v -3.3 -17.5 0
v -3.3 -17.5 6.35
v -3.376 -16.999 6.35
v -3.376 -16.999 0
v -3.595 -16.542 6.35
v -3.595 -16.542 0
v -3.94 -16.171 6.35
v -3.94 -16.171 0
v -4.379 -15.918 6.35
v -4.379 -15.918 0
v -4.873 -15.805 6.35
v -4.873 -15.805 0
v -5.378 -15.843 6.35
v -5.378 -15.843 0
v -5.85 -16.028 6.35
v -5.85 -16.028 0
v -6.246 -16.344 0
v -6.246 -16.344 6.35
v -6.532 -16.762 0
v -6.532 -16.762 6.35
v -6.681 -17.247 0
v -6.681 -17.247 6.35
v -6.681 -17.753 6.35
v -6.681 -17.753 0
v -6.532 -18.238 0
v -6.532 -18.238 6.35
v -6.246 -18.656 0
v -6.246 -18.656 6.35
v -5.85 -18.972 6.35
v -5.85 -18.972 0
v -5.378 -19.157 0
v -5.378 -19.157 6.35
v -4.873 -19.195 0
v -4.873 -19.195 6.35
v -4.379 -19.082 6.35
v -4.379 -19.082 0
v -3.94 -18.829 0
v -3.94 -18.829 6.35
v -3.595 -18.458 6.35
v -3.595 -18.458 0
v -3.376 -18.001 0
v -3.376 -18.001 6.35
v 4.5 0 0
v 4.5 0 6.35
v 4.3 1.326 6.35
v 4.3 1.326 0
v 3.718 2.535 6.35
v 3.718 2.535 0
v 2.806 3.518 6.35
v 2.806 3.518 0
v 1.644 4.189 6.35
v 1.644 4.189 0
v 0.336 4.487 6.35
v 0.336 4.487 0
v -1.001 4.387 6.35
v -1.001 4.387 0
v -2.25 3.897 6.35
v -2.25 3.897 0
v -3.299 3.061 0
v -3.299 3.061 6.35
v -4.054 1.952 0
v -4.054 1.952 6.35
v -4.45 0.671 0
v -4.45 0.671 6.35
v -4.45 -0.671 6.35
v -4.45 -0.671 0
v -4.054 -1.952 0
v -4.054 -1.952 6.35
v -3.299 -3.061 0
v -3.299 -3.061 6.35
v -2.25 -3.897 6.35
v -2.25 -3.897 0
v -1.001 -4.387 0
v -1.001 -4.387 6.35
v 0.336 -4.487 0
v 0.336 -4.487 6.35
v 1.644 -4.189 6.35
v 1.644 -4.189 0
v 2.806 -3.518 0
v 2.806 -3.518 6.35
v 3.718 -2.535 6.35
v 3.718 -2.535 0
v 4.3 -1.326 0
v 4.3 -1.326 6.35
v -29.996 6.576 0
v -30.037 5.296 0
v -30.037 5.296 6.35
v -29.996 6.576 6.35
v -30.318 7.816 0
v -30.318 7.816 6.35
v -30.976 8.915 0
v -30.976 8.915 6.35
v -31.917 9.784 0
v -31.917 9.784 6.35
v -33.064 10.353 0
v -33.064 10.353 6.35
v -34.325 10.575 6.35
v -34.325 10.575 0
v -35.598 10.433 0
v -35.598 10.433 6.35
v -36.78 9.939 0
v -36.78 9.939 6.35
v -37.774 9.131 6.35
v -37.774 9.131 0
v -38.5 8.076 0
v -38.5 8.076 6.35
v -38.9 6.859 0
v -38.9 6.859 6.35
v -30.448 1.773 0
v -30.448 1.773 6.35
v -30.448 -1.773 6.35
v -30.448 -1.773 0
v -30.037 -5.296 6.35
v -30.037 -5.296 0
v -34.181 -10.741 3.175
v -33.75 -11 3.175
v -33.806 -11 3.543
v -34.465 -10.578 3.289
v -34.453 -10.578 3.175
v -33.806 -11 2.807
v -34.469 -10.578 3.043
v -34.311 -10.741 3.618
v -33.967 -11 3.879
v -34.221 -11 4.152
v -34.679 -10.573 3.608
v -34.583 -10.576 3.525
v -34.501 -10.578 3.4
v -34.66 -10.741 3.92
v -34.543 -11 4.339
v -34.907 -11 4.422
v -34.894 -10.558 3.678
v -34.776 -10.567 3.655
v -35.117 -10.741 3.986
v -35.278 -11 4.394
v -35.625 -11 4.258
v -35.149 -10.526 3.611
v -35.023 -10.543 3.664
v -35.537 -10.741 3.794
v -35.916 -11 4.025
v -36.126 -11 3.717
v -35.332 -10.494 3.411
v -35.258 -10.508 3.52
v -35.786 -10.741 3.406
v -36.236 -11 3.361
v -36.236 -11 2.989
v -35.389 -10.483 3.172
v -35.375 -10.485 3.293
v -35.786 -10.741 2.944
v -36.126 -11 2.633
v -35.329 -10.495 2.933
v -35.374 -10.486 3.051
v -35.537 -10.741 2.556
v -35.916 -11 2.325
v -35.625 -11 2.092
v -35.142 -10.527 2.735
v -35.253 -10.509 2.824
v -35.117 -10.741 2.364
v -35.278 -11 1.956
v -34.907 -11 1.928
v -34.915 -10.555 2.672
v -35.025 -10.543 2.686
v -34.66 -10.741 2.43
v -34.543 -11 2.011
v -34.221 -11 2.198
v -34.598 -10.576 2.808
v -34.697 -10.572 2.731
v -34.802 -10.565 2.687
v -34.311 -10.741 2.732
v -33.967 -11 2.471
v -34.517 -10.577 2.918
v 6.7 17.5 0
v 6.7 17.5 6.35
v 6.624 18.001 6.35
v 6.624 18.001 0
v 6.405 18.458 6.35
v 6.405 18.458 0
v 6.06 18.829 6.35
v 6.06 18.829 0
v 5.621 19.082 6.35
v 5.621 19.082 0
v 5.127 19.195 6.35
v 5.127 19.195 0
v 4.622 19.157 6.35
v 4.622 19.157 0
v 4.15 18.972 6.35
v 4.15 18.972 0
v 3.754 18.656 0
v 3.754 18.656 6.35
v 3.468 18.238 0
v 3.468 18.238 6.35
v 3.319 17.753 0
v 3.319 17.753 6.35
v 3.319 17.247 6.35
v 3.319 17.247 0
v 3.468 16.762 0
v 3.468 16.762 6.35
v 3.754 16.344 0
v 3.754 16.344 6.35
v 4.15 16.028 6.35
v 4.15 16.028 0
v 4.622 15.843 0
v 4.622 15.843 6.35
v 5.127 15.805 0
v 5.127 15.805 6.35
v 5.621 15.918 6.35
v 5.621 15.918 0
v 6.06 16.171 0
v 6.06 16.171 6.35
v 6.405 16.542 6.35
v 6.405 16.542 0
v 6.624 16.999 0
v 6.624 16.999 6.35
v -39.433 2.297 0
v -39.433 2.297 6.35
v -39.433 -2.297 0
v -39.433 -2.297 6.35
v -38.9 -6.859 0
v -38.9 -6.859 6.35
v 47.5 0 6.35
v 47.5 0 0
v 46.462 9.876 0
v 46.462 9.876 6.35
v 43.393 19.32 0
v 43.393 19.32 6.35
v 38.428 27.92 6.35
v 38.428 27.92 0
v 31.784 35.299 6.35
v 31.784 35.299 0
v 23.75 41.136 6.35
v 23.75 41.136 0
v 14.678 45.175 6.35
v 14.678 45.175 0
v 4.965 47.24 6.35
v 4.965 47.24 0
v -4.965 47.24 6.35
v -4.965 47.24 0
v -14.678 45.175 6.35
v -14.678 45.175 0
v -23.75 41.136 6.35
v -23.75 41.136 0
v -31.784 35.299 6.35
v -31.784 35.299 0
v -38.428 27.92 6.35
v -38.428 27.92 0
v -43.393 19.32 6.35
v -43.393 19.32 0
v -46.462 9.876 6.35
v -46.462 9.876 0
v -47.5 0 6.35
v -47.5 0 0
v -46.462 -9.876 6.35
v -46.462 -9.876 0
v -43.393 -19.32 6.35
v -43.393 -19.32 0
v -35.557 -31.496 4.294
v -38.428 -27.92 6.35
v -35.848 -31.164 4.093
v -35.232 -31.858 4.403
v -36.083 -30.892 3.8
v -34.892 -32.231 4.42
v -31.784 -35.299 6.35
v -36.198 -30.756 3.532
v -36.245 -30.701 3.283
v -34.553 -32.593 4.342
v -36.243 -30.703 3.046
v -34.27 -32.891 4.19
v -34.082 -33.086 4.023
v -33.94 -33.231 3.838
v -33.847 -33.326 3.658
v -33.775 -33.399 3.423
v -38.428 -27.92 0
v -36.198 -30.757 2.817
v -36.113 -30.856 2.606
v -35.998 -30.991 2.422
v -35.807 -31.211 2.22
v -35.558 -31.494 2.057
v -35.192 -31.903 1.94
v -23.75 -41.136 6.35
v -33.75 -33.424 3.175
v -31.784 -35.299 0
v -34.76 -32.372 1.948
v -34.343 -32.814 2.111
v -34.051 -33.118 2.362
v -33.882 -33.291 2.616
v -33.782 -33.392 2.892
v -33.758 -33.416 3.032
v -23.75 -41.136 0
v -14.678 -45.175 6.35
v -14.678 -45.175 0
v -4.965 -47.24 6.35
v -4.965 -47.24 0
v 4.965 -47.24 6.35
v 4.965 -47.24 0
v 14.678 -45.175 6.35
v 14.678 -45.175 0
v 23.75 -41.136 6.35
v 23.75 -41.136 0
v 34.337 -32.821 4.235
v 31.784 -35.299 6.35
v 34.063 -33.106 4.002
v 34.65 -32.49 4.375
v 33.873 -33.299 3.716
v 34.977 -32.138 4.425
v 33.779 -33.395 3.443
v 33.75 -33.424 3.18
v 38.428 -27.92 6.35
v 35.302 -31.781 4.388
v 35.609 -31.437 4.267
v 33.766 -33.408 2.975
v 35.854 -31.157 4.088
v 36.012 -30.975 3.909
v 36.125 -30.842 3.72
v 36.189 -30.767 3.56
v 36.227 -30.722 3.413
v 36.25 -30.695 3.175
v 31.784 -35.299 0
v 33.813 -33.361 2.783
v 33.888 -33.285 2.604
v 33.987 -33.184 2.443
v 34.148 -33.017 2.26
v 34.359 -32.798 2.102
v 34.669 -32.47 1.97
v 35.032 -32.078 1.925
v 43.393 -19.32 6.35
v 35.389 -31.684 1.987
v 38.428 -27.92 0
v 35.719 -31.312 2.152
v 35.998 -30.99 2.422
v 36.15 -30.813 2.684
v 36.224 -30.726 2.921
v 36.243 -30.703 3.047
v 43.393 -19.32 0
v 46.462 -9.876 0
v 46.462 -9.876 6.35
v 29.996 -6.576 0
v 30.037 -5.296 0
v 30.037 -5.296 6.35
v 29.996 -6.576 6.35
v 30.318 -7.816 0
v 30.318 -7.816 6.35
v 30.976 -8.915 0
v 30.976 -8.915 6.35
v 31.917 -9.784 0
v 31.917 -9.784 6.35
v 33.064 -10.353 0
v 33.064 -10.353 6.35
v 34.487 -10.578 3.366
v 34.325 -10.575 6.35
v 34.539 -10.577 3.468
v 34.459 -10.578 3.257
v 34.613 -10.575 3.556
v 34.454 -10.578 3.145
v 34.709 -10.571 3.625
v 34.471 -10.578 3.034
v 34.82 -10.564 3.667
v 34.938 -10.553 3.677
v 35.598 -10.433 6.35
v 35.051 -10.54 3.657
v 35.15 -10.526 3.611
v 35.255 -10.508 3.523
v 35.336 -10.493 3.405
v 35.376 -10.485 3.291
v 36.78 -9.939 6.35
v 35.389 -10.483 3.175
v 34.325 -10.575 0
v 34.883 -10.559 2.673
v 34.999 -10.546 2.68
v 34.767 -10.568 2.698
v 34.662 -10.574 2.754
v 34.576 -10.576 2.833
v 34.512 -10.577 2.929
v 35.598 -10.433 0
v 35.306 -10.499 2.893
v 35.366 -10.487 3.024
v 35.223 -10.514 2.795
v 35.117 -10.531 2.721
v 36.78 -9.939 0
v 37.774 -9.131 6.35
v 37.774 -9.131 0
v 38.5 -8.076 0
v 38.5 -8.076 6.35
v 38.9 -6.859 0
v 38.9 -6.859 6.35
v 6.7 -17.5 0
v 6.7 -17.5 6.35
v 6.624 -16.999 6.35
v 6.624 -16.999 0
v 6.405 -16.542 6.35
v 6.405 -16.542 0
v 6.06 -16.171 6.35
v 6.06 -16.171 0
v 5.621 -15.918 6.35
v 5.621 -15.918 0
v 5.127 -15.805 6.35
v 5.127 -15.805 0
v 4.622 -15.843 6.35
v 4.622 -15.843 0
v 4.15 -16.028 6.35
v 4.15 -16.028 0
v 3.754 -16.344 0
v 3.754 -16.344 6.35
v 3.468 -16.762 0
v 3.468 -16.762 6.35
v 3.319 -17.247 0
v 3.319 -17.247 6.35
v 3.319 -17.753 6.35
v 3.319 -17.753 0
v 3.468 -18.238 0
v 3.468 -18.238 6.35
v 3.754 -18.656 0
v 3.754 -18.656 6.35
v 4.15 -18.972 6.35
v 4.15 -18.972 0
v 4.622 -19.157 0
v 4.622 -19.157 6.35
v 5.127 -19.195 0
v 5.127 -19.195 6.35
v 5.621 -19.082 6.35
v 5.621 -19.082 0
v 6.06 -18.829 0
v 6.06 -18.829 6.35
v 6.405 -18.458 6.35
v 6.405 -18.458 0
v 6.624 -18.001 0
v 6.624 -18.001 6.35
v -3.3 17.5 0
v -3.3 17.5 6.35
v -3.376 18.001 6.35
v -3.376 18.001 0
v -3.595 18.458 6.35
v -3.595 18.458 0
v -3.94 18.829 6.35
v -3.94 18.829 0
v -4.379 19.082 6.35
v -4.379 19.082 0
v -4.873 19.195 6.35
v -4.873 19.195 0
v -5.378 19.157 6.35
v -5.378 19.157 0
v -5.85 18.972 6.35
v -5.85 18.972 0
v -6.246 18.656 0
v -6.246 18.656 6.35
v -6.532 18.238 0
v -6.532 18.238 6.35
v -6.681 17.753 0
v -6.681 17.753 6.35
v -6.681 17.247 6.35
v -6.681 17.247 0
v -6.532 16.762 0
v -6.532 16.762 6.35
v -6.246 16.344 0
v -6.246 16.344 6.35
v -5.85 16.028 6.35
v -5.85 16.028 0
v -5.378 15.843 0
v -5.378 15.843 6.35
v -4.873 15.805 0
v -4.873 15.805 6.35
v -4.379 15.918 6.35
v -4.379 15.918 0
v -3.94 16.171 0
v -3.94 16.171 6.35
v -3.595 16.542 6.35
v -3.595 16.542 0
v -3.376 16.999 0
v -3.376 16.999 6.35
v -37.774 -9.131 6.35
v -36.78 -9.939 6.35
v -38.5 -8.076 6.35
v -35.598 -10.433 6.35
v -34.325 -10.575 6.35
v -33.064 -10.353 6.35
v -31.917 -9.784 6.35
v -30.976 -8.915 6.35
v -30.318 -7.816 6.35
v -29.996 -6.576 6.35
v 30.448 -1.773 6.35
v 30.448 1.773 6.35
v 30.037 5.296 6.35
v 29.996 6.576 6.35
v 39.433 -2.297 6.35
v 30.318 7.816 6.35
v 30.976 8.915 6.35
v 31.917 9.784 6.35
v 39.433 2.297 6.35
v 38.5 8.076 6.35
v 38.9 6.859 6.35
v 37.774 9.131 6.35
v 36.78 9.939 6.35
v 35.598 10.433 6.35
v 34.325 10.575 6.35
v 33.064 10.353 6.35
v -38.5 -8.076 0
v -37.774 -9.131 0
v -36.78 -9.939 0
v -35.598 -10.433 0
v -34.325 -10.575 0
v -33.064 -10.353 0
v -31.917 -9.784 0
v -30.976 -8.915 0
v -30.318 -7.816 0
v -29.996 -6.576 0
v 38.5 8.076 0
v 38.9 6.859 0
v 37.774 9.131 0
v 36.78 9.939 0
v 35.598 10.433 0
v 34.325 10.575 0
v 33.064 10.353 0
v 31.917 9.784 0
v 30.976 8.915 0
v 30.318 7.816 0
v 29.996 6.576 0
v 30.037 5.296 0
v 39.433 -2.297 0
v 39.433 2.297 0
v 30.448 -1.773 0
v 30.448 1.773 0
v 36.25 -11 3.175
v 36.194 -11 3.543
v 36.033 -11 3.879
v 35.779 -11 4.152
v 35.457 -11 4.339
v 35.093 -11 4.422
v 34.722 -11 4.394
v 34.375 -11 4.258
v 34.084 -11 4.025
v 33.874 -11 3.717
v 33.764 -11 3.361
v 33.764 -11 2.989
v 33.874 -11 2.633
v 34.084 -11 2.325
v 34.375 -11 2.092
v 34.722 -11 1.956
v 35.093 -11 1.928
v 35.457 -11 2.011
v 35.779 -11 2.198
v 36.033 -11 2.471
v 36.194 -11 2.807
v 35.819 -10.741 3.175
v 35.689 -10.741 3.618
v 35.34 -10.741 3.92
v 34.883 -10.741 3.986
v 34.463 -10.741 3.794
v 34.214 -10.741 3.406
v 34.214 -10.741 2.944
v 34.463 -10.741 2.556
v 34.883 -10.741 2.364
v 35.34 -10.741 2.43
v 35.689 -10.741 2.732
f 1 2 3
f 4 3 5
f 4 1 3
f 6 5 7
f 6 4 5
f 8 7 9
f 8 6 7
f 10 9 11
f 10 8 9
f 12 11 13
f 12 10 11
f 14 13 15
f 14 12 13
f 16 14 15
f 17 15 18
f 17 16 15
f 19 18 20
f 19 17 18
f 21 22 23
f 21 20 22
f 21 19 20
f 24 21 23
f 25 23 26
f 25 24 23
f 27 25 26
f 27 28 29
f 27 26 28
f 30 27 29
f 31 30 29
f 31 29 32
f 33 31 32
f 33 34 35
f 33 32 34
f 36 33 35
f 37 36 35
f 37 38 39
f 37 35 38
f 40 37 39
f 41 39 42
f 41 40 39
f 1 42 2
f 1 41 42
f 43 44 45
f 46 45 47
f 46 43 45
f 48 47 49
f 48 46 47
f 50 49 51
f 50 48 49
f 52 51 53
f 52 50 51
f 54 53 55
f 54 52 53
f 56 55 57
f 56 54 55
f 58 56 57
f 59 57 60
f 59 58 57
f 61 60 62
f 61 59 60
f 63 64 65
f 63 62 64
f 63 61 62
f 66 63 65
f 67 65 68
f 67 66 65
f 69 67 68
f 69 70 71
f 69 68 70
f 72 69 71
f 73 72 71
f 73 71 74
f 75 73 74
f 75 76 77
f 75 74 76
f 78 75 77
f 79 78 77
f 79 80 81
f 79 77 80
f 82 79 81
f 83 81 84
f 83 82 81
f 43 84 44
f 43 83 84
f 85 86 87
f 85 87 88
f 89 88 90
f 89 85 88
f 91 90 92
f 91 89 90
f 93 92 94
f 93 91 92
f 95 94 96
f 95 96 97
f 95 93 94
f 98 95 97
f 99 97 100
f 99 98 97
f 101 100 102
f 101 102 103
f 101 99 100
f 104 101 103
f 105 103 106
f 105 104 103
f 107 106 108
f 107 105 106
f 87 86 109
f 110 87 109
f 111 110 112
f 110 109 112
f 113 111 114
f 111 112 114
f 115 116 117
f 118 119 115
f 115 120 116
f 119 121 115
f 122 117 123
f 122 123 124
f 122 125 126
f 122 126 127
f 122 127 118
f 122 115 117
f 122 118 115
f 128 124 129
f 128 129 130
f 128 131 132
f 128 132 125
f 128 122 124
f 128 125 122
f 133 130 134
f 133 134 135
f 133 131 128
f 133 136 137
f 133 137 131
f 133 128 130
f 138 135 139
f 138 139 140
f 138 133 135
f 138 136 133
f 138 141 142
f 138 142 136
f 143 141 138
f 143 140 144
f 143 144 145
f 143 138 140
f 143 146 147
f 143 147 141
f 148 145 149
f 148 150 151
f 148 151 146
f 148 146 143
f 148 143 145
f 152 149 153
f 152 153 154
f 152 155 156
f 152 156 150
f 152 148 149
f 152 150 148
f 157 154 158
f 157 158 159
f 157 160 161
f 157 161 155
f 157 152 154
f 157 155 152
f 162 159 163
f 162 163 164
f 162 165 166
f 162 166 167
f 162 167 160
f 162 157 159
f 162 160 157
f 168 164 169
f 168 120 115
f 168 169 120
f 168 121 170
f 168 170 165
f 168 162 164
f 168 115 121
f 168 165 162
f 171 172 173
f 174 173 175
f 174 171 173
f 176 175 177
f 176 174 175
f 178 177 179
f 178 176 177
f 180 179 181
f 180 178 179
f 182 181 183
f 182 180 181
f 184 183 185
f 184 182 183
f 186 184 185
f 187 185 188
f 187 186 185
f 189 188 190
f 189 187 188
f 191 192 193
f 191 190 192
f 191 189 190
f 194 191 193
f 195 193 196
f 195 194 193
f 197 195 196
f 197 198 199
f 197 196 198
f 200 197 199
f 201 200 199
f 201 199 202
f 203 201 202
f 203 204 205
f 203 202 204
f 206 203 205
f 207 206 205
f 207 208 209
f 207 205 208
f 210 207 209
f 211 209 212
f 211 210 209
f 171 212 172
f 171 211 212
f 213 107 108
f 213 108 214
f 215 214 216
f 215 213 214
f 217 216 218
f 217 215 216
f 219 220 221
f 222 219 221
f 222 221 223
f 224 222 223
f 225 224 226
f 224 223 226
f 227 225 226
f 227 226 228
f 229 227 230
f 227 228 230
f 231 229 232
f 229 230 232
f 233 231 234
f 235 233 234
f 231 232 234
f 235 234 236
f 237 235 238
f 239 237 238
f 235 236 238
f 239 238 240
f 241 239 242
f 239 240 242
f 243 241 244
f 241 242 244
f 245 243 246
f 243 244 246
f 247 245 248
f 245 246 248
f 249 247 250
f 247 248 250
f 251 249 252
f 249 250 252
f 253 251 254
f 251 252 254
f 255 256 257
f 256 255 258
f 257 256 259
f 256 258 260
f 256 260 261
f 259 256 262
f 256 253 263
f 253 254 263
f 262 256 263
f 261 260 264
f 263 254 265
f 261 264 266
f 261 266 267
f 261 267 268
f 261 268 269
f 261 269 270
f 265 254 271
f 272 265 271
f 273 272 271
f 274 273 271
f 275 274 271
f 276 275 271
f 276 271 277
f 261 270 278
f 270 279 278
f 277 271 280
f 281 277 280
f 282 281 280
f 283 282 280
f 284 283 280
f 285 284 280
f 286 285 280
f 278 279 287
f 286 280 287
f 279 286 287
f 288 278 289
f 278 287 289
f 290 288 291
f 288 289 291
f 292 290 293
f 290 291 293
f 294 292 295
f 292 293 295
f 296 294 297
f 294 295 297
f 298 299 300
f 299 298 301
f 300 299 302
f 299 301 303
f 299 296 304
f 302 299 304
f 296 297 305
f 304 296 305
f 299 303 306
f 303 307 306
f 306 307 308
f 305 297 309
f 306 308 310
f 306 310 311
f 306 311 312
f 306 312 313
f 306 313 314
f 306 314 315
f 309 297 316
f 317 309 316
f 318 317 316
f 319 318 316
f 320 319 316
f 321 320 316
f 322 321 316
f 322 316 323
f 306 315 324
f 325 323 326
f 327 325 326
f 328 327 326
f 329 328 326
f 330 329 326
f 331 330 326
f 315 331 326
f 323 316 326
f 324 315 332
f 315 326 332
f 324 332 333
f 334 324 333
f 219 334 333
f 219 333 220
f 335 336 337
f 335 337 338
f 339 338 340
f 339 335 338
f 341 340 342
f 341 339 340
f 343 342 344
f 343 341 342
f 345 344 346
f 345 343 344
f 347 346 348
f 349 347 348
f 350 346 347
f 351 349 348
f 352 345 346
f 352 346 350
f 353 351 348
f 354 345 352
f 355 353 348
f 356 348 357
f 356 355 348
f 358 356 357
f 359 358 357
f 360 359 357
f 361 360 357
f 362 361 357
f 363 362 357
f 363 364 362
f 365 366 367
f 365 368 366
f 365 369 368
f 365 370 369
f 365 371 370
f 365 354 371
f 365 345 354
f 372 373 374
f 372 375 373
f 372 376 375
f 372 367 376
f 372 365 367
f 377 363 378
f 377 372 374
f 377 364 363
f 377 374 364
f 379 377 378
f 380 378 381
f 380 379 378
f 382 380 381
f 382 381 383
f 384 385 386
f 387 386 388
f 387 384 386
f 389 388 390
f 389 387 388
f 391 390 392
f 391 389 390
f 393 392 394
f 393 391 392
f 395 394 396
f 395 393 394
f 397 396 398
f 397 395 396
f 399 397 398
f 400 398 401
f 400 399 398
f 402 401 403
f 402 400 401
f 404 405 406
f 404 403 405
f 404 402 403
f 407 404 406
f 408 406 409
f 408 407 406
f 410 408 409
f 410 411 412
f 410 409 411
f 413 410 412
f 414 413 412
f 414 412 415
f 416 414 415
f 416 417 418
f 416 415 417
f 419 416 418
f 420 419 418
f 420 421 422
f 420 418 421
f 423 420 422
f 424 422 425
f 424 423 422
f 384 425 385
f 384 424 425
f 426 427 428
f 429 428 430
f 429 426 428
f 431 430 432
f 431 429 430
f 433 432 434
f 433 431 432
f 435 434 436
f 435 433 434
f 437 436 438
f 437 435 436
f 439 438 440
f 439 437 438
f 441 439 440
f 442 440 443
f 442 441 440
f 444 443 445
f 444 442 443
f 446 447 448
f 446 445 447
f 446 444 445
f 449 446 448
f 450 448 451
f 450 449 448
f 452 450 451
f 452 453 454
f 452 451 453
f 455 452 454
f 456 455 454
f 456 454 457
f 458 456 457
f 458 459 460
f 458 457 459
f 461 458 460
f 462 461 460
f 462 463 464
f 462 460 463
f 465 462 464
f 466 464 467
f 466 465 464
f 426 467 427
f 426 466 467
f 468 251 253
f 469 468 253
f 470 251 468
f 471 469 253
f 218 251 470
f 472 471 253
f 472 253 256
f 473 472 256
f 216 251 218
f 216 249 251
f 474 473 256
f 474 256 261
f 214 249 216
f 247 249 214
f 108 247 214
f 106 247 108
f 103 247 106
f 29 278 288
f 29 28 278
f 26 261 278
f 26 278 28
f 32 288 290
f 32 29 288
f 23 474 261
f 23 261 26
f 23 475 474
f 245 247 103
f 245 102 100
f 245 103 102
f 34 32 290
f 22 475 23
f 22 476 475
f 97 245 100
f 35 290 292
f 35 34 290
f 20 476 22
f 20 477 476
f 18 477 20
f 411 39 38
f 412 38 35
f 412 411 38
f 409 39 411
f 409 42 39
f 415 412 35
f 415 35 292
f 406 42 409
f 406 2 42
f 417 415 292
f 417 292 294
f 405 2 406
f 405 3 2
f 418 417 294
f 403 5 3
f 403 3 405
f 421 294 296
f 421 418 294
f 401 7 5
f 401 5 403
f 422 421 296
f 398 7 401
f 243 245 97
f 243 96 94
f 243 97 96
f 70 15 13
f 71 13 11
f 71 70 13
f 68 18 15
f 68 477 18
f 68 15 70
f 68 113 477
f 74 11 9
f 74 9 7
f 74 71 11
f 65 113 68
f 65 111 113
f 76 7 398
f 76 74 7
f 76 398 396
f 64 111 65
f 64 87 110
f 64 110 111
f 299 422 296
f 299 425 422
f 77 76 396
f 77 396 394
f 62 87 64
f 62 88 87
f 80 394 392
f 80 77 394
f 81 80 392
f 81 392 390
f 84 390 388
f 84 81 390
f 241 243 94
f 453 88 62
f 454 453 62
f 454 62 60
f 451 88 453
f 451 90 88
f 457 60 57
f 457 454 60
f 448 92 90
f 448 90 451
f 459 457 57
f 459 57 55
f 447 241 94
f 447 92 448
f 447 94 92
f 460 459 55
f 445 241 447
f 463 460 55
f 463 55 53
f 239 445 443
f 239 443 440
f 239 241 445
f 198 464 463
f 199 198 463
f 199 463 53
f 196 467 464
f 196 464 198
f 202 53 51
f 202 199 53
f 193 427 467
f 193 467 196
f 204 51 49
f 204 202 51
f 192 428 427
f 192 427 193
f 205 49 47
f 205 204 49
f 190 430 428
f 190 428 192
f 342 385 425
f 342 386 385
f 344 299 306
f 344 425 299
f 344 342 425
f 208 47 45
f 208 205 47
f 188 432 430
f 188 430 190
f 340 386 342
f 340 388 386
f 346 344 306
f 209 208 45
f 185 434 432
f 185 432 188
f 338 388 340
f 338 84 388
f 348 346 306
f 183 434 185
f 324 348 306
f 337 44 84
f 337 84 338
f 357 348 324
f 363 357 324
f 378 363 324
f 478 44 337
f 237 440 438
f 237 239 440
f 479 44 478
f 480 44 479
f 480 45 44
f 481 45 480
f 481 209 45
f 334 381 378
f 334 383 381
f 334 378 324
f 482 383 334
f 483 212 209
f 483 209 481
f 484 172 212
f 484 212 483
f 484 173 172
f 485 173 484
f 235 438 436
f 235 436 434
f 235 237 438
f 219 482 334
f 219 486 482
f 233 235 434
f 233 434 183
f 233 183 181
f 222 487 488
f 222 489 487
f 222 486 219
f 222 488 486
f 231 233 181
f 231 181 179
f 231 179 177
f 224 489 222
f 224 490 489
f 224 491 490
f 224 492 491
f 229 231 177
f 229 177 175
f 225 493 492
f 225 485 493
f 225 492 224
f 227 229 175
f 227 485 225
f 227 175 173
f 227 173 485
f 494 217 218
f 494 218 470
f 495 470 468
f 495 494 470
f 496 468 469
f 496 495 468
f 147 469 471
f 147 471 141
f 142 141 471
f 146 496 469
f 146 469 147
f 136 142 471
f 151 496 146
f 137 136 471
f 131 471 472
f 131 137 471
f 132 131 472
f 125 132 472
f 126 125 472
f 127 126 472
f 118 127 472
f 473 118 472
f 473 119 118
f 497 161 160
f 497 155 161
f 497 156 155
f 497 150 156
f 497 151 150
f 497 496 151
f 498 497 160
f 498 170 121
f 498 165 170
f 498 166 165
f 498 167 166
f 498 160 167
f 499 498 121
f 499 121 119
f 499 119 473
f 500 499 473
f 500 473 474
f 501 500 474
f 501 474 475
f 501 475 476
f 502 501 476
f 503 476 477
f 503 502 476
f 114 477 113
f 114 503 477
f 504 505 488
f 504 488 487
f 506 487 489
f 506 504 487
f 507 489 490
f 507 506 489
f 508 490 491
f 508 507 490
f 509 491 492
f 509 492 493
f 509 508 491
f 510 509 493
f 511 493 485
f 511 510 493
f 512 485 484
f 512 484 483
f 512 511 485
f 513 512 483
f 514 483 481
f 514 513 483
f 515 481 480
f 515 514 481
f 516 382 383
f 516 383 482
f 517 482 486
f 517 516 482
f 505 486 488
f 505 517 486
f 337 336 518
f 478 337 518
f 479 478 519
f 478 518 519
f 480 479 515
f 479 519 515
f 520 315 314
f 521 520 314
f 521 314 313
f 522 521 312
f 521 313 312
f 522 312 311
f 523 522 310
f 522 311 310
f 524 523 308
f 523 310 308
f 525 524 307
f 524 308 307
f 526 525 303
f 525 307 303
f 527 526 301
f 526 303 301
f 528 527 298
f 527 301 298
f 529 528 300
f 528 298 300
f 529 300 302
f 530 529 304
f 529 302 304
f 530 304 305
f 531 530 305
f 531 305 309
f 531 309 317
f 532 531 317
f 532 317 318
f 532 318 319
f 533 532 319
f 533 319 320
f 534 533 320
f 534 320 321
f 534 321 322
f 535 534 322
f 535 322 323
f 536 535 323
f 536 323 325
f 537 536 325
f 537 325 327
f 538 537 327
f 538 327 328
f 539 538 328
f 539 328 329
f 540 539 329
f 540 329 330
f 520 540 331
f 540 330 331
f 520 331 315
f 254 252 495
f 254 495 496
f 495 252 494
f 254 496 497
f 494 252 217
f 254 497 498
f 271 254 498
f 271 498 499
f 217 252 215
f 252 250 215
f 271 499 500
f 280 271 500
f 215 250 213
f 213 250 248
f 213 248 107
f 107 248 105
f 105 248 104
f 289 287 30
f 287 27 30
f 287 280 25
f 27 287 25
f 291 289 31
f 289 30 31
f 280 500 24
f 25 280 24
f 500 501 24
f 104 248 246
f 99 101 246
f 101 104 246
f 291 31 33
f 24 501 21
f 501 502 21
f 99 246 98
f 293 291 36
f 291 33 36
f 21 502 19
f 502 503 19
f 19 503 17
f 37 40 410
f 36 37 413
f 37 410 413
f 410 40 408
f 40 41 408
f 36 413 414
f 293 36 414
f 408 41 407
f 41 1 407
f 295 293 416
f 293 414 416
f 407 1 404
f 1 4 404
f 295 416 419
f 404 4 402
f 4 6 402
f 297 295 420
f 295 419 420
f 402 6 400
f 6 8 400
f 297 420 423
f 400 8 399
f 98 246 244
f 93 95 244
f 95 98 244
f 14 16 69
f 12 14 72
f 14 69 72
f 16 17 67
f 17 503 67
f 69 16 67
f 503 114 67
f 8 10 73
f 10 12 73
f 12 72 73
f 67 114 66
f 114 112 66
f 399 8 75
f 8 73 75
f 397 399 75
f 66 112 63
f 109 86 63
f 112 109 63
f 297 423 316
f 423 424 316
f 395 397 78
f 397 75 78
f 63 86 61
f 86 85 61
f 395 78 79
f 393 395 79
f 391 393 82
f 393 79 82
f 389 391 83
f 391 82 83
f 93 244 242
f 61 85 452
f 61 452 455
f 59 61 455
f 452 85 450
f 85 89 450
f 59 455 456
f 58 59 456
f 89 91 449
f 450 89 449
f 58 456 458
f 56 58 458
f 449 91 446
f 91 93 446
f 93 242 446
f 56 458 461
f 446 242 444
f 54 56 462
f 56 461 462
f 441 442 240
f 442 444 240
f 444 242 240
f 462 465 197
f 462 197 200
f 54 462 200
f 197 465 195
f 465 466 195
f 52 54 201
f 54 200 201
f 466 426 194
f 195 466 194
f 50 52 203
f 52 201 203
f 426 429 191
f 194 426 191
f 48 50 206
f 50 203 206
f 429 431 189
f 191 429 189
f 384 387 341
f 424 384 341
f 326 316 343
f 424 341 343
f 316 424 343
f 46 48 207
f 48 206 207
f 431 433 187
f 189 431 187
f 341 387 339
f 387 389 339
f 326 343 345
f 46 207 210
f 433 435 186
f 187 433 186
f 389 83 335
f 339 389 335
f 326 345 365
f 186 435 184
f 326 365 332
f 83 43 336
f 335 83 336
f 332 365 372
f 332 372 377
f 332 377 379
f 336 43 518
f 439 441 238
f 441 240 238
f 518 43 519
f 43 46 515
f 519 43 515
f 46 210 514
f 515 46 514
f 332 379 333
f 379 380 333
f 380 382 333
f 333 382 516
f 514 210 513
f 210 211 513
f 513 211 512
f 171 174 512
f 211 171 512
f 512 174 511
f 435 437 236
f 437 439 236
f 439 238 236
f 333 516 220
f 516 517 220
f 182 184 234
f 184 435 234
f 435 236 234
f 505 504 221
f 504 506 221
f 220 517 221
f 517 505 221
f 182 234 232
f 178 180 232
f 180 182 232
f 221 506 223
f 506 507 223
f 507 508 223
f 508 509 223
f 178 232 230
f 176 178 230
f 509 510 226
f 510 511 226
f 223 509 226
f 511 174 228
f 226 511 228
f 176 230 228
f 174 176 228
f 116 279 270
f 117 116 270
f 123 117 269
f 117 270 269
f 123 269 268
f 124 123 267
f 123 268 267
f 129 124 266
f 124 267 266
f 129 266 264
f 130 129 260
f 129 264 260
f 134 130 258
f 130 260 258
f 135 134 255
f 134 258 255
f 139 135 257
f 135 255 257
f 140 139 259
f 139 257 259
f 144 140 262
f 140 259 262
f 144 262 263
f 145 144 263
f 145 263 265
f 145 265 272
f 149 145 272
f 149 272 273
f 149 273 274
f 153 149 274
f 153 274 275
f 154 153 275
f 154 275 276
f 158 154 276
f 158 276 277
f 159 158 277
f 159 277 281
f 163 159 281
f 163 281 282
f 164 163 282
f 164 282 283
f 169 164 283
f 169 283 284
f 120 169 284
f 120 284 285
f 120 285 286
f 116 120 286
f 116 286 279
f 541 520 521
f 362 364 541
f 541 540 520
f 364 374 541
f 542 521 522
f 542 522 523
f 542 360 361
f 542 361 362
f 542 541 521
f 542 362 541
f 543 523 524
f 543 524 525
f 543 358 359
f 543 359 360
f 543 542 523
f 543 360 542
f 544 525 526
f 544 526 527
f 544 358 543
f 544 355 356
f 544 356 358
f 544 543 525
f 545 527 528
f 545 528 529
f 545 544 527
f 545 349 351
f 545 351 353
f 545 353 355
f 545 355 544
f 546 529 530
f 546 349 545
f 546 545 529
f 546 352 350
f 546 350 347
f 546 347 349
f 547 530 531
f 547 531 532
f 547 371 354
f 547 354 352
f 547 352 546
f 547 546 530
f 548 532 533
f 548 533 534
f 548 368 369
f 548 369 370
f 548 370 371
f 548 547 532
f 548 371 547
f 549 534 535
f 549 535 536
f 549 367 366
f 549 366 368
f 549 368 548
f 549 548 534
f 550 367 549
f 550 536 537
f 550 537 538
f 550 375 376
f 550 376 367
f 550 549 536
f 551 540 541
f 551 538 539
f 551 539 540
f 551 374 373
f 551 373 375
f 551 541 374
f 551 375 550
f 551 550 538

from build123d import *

# Parameters (mm, degrees)
SKETCH_R       = 47.5
PAD_DEPTH      = 6.35
SKETCH001_R    = 4.5
HOLE_DEPTH     = 6.351
SKETCH002_R    = 1.7
HOLE001_DEPTH  = 25
SKETCH003_R    = 1.25
HOLE002_DEPTH  = 25
HOLE002_TIPS_R = 1.25


with BuildPart() as part:
    # Sketch → Pad (new body)
    with BuildSketch(Plane.XY):
        Circle(SKETCH_R)
        with BuildLine():
            ThreePointArc((-38.899906, 6.859103), (-39.5, 0), (-38.899906, -6.859103))
            ThreePointArc((-38.899906, -6.859103), (-33.686855, -10.509321), (-30.036636, -5.296269))
            ThreePointArc((-30.036636, 5.296269), (-30.5, 0), (-30.036636, -5.296269))
            ThreePointArc((-30.036636, 5.296269), (-33.686855, 10.509321), (-38.899906, 6.859103))
        make_face(mode=Mode.SUBTRACT)
        with BuildLine():
            ThreePointArc((30.036636, -5.296269), (30.5, 0), (30.036636, 5.296269))
            ThreePointArc((38.899906, 6.859103), (33.686855, 10.509321), (30.036636, 5.296269))
            ThreePointArc((38.899906, -6.859103), (39.5, 0), (38.899906, 6.859103))
            ThreePointArc((30.036636, -5.296269), (33.686855, -10.509321), (38.899906, -6.859103))
        make_face(mode=Mode.SUBTRACT)
    extrude(amount=PAD_DEPTH)

    # Sketch001 → Hole (cut, through all)
    with BuildSketch(Plane.XY):
        Circle(SKETCH001_R)
    extrude(amount=HOLE_DEPTH, mode=Mode.SUBTRACT)

    # Sketch002 → Hole001 (cut)
    with BuildSketch(Plane.XY):
        with Locations((-5, -17.5)):
            Circle(SKETCH002_R)
        with Locations((5, -17.5)):
            Circle(SKETCH002_R)
        with Locations((5, 17.5)):
            Circle(SKETCH002_R)
        with Locations((-5, 17.5)):
            Circle(SKETCH002_R)
    extrude(amount=HOLE001_DEPTH, mode=Mode.SUBTRACT)

    # Sketch003 → Hole002 (cut)
    with BuildSketch(Plane.XZ.offset(36)):
        with Locations((-35, 3.175)):
            Circle(SKETCH003_R)
        with Locations((35, 3.175)):
            Circle(SKETCH003_R)
    extrude(amount=-HOLE002_DEPTH, mode=Mode.SUBTRACT)

    # Hole002 tips → Hole002 tip 1 section 0
    with BuildSketch(Plane.XZ.offset(11), mode=Mode.PRIVATE) as hole002_tip_1_s0:
        with Locations((-35, 3.175)):
            Circle(HOLE002_TIPS_R)
    loft([hole002_tip_1_s0.sketch, Vertex(-35, -10.248924, 3.175)], mode=Mode.SUBTRACT)

    # Hole002 tips → Hole002 tip 2 section 0
    with BuildSketch(Plane.XZ.offset(11), mode=Mode.PRIVATE) as hole002_tip_2_s0:
        with Locations((35, 3.175)):
            Circle(HOLE002_TIPS_R)
    loft([hole002_tip_2_s0.sketch, Vertex(35, -10.248924, 3.175)], mode=Mode.SUBTRACT)


solid = part.part
